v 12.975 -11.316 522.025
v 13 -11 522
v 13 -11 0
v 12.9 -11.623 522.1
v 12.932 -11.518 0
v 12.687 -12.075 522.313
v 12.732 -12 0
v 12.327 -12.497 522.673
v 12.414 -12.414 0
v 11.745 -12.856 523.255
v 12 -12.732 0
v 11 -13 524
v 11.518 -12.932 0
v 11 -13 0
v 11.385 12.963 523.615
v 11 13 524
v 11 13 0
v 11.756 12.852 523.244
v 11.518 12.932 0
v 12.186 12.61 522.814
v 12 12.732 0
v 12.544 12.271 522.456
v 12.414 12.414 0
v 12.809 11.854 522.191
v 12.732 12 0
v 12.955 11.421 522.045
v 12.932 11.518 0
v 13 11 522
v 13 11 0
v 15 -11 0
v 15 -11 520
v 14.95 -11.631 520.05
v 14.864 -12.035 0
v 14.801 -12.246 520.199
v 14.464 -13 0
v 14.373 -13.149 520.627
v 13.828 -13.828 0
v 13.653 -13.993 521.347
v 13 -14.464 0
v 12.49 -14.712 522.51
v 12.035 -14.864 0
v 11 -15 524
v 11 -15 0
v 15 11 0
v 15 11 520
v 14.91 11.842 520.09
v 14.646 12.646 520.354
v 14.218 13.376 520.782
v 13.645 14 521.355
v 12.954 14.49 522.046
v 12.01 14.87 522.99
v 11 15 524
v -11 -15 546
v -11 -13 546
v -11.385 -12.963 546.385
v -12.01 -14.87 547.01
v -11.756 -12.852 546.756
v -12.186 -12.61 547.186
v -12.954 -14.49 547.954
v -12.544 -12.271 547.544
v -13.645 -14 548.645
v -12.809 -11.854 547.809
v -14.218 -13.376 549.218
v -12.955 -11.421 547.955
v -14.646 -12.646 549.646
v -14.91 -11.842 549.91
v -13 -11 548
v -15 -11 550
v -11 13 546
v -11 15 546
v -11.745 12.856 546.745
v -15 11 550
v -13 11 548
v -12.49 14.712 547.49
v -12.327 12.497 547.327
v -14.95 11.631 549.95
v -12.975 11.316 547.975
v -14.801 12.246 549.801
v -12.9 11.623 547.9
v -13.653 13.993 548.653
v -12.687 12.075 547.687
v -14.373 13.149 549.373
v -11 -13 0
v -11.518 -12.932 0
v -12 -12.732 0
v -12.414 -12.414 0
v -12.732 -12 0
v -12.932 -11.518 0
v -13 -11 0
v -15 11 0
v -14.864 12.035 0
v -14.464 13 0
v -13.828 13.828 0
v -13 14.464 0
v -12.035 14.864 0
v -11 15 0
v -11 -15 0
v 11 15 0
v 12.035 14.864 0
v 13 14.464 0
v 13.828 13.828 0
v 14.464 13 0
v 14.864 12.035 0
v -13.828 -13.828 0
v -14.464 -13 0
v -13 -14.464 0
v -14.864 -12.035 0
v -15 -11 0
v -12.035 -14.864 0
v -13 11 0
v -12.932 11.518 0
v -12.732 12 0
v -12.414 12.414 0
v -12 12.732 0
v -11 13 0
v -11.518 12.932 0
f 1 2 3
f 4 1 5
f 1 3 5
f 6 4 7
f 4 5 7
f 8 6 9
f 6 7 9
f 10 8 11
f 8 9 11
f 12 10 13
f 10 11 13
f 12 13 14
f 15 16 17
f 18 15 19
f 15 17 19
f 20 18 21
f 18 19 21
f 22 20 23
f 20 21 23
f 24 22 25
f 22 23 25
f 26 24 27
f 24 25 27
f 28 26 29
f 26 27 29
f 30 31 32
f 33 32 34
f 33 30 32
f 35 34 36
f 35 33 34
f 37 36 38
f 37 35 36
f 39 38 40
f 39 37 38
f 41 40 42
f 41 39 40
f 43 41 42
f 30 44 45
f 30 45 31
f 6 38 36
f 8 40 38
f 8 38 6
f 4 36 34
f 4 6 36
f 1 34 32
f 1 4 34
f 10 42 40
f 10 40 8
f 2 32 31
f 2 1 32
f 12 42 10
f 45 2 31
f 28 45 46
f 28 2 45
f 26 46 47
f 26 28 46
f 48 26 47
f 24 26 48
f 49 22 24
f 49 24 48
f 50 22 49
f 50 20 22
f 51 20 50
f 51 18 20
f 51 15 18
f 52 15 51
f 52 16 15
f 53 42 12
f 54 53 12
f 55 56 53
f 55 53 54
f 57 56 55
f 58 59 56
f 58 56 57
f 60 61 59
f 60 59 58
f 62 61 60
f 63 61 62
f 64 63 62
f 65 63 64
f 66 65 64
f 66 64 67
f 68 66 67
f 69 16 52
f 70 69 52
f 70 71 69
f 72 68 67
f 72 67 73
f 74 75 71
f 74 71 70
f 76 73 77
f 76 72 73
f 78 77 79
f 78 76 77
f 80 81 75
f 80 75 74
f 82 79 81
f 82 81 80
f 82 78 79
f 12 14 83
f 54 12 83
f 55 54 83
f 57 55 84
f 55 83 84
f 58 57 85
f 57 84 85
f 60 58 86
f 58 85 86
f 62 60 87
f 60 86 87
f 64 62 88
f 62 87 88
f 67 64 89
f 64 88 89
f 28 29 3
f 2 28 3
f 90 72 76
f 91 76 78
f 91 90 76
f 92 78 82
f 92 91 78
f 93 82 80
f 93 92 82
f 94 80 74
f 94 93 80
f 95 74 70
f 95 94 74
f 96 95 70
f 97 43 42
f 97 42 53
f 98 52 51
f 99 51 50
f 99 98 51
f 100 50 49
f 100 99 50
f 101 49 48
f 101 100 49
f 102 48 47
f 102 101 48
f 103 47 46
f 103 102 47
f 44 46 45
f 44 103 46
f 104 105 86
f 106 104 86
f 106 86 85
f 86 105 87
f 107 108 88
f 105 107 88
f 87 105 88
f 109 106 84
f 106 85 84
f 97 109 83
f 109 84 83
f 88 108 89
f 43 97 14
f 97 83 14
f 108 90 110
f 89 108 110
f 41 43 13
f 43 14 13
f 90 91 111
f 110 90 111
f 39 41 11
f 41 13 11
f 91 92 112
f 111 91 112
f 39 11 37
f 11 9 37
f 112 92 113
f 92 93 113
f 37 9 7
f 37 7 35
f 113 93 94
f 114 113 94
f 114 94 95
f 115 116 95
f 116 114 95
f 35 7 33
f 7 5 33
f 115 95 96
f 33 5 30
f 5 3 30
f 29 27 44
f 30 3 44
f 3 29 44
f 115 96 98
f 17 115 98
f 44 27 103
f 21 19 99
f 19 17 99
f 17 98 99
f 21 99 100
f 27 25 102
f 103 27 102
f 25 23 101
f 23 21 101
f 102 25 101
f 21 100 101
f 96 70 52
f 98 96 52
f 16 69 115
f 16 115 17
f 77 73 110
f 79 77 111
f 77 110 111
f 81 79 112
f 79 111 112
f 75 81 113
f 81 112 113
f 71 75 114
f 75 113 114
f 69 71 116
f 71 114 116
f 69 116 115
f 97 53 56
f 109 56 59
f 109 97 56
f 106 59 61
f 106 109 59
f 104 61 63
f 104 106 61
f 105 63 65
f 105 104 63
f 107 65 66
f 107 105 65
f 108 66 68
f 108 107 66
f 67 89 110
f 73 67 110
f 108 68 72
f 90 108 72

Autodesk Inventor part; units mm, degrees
ref_plane "Plano inicial" through (0, 0, 0) normal (0, 0, 1) x (1, 0, 0)
ref_plane "Plano final" through (0, 0, 550) normal (0, 0, 1) x (1, 0, 0)
sketch "Esboço" plane through (0, 0, 0) normal (0, 0, 1) x (1, 0, 0)
  line L0 (-15, -11) -> (-15, 11)
  line L1 (-11, 15) -> (11, 15)
  line L2 (15, 11) -> (15, -11)
  line L3 (11, -15) -> (-11, -15)
  arc A0 (-15, -11) -> (-11, -15) centre (-11, -11) ccw
  arc A1 (15, 11) -> (11, 15) centre (11, 11) ccw
  arc A2 (-11, 15) -> (-15, 11) centre (-11, 11) ccw
  arc A3 (11, -15) -> (15, -11) centre (11, -11) ccw
  arc A4 (-11, 13) -> (-13, 11) centre (-11, 11) ccw
  line L4 (-11, 13) -> (11, 13)
  arc A5 (13, 11) -> (11, 13) centre (11, 11) ccw
  line L5 (13, 11) -> (13, -11)
  arc A6 (11, -13) -> (13, -11) centre (11, -11) ccw
  line L6 (11, -13) -> (-11, -13)
  arc A7 (-13, -11) -> (-11, -13) centre (-11, -11) ccw
  line L7 (-13, -11) -> (-13, 11)
  line L8 (0, 22.1598) -> (0, -22.1598) construction
  line L9 (-22.1598, 0) -> (22.1598, 0) construction
  dimension "d7" = 4
  dimension "d9" = 30
  dimension "d11" = 30
  dimension "d12" = 2
  dimension "d15" = 15
  dimension "d16" = 15
extrude "Corpo" add sketch "Esboço" along normal up to surface (550 mm away) from surface at 0
sketch "Sketch3" plane through (0, 0, 0) normal (0, 0, 1) x (1, 0, 0)
  line L0 (0, 0) -> (10, 0)
ref_plane "Work Plane3" through (0, 0, 0) normal (0, -1, 0) x (1, 0, 0)
sketch "Sketch4" plane through (0, 0, 0) normal (0, -1, 0) x (1, 0, 0)
  line L0 (-2, 0) -> (12, 0)
  line L1 (-2, 550) -> (12, 550)
  dimension "d18" = 550
ref_plane "Plano de trabalho4" through (-15, 0, 550) normal (0.7071, 0, 0.7071) x (0.7071, 0, -0.7071)
split "Dividir1" plane through (-15, 0, 550) removes the side toward (0.7071, 0, 0.7071)
equation "\"d7\" = G_IR"
equation "\"d9\" = G_W"
equation "\"d11\" = G_H"
equation "\"d12\" = G_T"
equation "\"d15\" = 0.5 * d9"
equation "\"d16\" = 0.5 * d11"
equation "\"d3\" = G_L"
equation "\"G_W\" = 30"
equation "\"G_H\" = 30"
equation "\"G_T\" = 2"
equation "\"G_IR\" = 4"
equation "\"G_L\" = d18"
equation "\"G_OFFSET_START\" = 0"
equation "\"G_OFFSET_END\" = 0"
properties part number "ISO 10799-2 - 30x30x2 - 550" material "Aço, suave"
